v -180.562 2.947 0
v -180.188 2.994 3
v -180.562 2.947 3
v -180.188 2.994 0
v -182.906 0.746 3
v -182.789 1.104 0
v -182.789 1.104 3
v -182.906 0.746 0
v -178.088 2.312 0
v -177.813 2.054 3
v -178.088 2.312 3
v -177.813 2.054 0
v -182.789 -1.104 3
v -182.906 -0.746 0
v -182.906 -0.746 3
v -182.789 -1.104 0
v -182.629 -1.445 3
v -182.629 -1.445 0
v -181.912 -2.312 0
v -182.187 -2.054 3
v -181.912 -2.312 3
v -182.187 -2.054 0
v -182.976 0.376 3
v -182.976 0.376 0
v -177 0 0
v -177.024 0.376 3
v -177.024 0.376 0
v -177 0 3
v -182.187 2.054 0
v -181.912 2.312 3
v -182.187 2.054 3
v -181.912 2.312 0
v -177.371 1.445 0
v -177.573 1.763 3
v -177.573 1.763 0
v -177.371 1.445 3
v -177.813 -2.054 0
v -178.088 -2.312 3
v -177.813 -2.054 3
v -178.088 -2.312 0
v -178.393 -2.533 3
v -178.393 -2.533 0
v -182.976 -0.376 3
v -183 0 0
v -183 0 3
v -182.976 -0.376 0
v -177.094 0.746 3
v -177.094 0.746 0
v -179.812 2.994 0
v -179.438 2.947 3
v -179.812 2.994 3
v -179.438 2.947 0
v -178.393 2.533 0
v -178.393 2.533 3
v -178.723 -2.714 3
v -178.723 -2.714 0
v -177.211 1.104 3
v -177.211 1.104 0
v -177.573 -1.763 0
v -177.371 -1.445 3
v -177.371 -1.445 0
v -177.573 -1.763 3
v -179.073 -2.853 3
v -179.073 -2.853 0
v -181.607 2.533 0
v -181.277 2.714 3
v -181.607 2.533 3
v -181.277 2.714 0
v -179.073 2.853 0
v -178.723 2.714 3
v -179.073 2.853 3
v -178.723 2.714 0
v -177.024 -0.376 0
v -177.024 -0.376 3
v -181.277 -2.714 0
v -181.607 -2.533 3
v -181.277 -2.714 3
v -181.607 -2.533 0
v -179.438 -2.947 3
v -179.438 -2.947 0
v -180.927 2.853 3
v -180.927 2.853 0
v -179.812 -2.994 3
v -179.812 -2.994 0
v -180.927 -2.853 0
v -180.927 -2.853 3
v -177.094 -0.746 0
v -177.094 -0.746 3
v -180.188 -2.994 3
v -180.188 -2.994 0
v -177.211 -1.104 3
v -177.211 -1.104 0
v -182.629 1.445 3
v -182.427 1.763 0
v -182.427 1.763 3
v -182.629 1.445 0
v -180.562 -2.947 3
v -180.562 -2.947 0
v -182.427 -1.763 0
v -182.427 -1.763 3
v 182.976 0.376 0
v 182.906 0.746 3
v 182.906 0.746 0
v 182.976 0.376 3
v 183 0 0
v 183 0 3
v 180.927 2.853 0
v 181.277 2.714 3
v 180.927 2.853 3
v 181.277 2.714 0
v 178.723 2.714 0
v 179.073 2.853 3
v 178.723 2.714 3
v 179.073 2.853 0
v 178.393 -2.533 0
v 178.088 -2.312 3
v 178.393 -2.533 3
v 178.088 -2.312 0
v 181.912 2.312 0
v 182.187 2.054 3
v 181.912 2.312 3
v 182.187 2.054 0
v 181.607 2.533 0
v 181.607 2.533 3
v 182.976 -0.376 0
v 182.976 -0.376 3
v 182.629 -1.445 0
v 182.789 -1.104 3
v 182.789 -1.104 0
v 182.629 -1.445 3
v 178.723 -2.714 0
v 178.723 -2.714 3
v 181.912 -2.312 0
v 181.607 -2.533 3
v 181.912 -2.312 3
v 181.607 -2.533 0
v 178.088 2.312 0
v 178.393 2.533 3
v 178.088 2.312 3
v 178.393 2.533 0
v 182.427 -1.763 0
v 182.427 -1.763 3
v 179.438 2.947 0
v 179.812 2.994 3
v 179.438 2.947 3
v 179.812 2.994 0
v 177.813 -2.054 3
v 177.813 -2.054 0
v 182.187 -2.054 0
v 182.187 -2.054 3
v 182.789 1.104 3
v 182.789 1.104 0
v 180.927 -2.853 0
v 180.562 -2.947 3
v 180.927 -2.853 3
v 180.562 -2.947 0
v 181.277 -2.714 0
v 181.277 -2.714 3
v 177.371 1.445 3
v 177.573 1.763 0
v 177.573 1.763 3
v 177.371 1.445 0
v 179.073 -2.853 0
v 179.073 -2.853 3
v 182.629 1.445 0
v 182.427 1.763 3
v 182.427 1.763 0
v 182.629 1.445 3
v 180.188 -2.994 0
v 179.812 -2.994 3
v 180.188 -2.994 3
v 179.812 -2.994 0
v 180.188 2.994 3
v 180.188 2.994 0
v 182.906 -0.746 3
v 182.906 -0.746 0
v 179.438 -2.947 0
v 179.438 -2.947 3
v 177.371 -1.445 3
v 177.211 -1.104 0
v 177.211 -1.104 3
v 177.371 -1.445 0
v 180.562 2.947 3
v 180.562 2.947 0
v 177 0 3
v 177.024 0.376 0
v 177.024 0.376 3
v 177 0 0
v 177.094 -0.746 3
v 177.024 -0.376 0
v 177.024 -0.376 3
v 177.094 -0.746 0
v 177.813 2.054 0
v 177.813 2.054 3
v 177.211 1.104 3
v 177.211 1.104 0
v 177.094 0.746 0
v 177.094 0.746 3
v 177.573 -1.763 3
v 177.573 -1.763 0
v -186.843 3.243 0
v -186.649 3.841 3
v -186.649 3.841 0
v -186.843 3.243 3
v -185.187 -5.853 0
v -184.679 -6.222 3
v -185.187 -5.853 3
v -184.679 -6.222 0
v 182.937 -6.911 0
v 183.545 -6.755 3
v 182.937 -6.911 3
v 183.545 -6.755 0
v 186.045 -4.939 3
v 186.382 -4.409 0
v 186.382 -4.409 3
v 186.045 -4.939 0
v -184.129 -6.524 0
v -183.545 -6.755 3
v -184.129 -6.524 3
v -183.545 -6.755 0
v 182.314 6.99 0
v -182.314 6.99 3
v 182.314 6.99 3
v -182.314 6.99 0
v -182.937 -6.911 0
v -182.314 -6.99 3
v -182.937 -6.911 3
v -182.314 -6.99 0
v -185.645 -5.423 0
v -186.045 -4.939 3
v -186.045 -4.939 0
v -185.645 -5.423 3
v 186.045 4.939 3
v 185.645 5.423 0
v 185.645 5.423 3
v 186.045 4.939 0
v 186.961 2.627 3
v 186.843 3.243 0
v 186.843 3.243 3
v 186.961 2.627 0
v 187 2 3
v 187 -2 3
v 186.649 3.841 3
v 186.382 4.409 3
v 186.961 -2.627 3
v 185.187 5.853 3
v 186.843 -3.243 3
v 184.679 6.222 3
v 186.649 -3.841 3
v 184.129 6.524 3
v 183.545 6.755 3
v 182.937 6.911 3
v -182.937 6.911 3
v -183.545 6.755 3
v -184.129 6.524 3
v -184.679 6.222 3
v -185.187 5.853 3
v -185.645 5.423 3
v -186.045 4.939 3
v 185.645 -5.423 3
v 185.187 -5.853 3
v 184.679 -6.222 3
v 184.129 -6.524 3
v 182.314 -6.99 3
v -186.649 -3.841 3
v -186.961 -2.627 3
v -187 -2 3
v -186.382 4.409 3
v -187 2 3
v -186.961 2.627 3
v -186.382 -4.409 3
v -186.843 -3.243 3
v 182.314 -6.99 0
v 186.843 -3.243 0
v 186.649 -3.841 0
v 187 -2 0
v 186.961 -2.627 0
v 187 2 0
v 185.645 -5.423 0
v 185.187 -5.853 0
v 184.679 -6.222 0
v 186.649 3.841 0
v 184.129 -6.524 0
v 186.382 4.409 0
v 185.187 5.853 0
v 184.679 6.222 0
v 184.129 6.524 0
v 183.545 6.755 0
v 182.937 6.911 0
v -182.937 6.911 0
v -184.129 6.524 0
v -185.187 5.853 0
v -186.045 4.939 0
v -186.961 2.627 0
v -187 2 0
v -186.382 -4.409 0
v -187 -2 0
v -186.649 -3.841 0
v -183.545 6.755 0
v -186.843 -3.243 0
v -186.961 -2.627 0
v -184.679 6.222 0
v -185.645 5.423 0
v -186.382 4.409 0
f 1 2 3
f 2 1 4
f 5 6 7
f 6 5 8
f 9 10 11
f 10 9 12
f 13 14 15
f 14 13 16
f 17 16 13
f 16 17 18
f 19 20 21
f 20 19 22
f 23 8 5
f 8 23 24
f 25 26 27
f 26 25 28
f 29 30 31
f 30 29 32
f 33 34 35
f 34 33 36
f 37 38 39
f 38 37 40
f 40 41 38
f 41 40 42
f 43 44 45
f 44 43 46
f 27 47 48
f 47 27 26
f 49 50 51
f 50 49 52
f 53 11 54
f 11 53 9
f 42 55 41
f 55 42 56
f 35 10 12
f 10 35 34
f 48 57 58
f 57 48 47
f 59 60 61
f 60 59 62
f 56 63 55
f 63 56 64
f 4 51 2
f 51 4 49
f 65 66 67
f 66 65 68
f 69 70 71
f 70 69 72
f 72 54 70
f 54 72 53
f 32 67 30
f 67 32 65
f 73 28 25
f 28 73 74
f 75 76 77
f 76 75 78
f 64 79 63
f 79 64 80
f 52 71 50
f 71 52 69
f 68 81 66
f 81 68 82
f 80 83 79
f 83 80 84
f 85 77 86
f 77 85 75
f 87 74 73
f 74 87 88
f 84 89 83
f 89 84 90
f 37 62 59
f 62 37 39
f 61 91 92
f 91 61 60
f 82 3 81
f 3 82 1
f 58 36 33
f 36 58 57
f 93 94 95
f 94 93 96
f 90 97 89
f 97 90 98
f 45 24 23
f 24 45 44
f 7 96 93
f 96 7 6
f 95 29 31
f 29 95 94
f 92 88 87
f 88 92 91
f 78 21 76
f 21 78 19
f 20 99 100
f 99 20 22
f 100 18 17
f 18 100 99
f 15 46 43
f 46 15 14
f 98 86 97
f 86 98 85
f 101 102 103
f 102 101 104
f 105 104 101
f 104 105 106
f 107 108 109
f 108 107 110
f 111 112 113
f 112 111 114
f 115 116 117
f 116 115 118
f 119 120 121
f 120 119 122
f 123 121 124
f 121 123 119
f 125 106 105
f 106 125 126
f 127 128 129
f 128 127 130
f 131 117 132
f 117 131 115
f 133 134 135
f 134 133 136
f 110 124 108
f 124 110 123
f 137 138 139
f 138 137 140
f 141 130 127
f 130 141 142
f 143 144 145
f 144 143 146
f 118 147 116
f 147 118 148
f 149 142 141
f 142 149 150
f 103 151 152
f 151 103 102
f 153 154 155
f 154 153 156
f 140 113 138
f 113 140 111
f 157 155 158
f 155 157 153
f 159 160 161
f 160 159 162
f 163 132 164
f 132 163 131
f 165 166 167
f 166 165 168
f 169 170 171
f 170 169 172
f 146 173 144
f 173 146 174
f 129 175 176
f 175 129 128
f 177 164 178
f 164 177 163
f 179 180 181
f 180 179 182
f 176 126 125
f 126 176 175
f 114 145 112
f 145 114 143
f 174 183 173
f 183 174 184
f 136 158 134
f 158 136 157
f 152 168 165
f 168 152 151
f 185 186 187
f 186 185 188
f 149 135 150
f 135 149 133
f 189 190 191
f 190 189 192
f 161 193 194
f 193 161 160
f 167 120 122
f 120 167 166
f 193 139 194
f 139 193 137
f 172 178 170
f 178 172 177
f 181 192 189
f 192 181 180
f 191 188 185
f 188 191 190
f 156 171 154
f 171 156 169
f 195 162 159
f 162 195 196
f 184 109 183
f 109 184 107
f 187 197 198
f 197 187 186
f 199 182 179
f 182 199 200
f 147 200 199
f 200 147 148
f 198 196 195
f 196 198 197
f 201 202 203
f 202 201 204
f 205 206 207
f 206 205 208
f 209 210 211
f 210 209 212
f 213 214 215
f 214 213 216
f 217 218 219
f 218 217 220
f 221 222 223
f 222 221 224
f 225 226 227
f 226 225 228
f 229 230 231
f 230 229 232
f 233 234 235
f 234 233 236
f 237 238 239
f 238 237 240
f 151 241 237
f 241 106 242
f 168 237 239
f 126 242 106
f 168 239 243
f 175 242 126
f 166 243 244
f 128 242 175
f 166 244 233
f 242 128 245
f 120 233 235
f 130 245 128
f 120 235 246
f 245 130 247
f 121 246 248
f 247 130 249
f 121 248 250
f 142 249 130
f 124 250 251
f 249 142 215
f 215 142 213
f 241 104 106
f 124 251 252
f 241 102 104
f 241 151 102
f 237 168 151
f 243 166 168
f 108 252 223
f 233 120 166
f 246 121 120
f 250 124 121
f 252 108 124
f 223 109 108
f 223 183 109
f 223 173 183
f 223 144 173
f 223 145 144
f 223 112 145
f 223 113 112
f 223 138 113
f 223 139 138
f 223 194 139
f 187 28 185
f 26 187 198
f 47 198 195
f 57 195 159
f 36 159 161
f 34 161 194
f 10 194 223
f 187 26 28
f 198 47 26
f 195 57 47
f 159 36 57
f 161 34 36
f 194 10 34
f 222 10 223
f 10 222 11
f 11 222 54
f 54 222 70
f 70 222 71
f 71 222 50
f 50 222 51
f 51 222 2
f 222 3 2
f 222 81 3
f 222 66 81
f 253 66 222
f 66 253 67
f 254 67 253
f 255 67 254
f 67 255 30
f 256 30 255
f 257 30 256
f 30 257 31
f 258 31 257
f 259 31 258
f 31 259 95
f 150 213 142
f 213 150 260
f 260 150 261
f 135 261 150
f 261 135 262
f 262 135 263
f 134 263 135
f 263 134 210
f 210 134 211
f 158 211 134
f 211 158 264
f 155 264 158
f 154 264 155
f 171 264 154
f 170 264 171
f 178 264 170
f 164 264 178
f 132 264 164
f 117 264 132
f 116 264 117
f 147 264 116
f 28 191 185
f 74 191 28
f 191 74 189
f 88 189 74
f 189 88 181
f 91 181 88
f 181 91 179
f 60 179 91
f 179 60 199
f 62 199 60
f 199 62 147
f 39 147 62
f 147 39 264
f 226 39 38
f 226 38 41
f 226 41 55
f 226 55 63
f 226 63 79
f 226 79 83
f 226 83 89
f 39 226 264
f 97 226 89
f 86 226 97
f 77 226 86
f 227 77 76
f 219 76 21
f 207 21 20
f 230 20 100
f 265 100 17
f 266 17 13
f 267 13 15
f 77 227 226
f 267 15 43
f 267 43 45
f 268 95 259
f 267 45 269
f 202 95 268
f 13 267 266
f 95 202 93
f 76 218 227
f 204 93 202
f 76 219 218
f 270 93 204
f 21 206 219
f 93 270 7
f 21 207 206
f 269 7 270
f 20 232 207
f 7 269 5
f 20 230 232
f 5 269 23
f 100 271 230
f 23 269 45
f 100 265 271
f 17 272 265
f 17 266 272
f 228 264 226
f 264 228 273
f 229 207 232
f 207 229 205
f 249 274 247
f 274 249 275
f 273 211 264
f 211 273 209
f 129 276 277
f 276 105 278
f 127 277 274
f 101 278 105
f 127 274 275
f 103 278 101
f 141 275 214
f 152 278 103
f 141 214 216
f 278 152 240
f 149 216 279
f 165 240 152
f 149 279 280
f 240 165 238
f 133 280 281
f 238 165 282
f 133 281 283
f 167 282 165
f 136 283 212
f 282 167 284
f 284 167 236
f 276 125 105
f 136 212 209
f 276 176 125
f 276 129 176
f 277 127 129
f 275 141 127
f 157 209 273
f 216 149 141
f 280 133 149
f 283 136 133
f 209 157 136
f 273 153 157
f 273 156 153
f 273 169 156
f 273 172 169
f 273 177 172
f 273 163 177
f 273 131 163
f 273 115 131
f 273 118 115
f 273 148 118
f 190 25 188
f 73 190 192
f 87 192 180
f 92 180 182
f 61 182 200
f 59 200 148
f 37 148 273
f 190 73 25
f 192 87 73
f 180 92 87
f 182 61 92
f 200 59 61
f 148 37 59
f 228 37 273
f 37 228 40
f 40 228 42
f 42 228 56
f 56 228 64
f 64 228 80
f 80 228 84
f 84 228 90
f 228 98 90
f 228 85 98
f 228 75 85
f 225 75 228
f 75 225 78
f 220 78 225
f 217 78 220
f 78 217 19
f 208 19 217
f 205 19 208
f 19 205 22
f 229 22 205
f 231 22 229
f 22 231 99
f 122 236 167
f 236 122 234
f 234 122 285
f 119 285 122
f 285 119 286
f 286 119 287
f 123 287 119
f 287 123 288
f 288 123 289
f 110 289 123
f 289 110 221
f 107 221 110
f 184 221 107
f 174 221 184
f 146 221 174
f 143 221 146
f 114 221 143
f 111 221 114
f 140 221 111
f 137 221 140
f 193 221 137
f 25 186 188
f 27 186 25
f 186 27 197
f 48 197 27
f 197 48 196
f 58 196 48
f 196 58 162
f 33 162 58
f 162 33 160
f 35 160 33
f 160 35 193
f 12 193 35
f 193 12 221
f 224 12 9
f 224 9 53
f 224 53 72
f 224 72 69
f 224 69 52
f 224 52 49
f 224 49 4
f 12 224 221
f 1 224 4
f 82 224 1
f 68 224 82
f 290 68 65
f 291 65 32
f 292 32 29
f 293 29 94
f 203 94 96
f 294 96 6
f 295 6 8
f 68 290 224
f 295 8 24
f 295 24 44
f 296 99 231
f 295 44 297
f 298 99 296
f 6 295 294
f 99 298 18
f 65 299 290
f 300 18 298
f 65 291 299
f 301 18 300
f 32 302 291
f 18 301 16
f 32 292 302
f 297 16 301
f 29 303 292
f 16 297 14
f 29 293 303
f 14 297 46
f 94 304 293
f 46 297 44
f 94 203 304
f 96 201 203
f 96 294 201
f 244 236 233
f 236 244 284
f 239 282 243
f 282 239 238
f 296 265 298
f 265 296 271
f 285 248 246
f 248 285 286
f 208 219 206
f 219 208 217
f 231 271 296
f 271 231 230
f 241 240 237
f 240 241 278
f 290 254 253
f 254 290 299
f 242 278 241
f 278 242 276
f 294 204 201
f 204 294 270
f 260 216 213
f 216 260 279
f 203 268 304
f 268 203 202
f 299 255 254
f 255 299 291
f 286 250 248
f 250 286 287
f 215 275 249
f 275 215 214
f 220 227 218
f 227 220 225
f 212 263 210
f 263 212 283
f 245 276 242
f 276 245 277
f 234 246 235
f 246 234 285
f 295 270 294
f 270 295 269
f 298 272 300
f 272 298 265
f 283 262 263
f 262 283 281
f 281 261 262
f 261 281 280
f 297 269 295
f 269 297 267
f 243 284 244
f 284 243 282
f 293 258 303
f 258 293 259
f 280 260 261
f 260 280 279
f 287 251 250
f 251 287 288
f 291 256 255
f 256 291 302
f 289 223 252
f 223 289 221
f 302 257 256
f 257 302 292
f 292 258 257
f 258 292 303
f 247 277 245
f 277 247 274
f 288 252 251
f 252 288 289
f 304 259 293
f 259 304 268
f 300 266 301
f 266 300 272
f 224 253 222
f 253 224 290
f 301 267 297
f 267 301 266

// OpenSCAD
$fn = 50;


difference() {
	union() {
		hull() {
			translate(v = [-182.0000000000, 2.0000000000, 0]) {
				cylinder(h = 3, r = 5);
			}
			translate(v = [182.0000000000, 2.0000000000, 0]) {
				cylinder(h = 3, r = 5);
			}
			translate(v = [-182.0000000000, -2.0000000000, 0]) {
				cylinder(h = 3, r = 5);
			}
			translate(v = [182.0000000000, -2.0000000000, 0]) {
				cylinder(h = 3, r = 5);
			}
		}
	}
	union() {
		translate(v = [-180.0000000000, 0.0000000000, -100.0000000000]) {
			cylinder(h = 200, r = 3.0000000000);
		}
		translate(v = [-180.0000000000, 0.0000000000, -100.0000000000]) {
			cylinder(h = 200, r = 3.0000000000);
		}
		translate(v = [180.0000000000, 0.0000000000, -100.0000000000]) {
			cylinder(h = 200, r = 3.0000000000);
		}
		translate(v = [180.0000000000, 0.0000000000, -100.0000000000]) {
			cylinder(h = 200, r = 3.0000000000);
		}
	}
}
